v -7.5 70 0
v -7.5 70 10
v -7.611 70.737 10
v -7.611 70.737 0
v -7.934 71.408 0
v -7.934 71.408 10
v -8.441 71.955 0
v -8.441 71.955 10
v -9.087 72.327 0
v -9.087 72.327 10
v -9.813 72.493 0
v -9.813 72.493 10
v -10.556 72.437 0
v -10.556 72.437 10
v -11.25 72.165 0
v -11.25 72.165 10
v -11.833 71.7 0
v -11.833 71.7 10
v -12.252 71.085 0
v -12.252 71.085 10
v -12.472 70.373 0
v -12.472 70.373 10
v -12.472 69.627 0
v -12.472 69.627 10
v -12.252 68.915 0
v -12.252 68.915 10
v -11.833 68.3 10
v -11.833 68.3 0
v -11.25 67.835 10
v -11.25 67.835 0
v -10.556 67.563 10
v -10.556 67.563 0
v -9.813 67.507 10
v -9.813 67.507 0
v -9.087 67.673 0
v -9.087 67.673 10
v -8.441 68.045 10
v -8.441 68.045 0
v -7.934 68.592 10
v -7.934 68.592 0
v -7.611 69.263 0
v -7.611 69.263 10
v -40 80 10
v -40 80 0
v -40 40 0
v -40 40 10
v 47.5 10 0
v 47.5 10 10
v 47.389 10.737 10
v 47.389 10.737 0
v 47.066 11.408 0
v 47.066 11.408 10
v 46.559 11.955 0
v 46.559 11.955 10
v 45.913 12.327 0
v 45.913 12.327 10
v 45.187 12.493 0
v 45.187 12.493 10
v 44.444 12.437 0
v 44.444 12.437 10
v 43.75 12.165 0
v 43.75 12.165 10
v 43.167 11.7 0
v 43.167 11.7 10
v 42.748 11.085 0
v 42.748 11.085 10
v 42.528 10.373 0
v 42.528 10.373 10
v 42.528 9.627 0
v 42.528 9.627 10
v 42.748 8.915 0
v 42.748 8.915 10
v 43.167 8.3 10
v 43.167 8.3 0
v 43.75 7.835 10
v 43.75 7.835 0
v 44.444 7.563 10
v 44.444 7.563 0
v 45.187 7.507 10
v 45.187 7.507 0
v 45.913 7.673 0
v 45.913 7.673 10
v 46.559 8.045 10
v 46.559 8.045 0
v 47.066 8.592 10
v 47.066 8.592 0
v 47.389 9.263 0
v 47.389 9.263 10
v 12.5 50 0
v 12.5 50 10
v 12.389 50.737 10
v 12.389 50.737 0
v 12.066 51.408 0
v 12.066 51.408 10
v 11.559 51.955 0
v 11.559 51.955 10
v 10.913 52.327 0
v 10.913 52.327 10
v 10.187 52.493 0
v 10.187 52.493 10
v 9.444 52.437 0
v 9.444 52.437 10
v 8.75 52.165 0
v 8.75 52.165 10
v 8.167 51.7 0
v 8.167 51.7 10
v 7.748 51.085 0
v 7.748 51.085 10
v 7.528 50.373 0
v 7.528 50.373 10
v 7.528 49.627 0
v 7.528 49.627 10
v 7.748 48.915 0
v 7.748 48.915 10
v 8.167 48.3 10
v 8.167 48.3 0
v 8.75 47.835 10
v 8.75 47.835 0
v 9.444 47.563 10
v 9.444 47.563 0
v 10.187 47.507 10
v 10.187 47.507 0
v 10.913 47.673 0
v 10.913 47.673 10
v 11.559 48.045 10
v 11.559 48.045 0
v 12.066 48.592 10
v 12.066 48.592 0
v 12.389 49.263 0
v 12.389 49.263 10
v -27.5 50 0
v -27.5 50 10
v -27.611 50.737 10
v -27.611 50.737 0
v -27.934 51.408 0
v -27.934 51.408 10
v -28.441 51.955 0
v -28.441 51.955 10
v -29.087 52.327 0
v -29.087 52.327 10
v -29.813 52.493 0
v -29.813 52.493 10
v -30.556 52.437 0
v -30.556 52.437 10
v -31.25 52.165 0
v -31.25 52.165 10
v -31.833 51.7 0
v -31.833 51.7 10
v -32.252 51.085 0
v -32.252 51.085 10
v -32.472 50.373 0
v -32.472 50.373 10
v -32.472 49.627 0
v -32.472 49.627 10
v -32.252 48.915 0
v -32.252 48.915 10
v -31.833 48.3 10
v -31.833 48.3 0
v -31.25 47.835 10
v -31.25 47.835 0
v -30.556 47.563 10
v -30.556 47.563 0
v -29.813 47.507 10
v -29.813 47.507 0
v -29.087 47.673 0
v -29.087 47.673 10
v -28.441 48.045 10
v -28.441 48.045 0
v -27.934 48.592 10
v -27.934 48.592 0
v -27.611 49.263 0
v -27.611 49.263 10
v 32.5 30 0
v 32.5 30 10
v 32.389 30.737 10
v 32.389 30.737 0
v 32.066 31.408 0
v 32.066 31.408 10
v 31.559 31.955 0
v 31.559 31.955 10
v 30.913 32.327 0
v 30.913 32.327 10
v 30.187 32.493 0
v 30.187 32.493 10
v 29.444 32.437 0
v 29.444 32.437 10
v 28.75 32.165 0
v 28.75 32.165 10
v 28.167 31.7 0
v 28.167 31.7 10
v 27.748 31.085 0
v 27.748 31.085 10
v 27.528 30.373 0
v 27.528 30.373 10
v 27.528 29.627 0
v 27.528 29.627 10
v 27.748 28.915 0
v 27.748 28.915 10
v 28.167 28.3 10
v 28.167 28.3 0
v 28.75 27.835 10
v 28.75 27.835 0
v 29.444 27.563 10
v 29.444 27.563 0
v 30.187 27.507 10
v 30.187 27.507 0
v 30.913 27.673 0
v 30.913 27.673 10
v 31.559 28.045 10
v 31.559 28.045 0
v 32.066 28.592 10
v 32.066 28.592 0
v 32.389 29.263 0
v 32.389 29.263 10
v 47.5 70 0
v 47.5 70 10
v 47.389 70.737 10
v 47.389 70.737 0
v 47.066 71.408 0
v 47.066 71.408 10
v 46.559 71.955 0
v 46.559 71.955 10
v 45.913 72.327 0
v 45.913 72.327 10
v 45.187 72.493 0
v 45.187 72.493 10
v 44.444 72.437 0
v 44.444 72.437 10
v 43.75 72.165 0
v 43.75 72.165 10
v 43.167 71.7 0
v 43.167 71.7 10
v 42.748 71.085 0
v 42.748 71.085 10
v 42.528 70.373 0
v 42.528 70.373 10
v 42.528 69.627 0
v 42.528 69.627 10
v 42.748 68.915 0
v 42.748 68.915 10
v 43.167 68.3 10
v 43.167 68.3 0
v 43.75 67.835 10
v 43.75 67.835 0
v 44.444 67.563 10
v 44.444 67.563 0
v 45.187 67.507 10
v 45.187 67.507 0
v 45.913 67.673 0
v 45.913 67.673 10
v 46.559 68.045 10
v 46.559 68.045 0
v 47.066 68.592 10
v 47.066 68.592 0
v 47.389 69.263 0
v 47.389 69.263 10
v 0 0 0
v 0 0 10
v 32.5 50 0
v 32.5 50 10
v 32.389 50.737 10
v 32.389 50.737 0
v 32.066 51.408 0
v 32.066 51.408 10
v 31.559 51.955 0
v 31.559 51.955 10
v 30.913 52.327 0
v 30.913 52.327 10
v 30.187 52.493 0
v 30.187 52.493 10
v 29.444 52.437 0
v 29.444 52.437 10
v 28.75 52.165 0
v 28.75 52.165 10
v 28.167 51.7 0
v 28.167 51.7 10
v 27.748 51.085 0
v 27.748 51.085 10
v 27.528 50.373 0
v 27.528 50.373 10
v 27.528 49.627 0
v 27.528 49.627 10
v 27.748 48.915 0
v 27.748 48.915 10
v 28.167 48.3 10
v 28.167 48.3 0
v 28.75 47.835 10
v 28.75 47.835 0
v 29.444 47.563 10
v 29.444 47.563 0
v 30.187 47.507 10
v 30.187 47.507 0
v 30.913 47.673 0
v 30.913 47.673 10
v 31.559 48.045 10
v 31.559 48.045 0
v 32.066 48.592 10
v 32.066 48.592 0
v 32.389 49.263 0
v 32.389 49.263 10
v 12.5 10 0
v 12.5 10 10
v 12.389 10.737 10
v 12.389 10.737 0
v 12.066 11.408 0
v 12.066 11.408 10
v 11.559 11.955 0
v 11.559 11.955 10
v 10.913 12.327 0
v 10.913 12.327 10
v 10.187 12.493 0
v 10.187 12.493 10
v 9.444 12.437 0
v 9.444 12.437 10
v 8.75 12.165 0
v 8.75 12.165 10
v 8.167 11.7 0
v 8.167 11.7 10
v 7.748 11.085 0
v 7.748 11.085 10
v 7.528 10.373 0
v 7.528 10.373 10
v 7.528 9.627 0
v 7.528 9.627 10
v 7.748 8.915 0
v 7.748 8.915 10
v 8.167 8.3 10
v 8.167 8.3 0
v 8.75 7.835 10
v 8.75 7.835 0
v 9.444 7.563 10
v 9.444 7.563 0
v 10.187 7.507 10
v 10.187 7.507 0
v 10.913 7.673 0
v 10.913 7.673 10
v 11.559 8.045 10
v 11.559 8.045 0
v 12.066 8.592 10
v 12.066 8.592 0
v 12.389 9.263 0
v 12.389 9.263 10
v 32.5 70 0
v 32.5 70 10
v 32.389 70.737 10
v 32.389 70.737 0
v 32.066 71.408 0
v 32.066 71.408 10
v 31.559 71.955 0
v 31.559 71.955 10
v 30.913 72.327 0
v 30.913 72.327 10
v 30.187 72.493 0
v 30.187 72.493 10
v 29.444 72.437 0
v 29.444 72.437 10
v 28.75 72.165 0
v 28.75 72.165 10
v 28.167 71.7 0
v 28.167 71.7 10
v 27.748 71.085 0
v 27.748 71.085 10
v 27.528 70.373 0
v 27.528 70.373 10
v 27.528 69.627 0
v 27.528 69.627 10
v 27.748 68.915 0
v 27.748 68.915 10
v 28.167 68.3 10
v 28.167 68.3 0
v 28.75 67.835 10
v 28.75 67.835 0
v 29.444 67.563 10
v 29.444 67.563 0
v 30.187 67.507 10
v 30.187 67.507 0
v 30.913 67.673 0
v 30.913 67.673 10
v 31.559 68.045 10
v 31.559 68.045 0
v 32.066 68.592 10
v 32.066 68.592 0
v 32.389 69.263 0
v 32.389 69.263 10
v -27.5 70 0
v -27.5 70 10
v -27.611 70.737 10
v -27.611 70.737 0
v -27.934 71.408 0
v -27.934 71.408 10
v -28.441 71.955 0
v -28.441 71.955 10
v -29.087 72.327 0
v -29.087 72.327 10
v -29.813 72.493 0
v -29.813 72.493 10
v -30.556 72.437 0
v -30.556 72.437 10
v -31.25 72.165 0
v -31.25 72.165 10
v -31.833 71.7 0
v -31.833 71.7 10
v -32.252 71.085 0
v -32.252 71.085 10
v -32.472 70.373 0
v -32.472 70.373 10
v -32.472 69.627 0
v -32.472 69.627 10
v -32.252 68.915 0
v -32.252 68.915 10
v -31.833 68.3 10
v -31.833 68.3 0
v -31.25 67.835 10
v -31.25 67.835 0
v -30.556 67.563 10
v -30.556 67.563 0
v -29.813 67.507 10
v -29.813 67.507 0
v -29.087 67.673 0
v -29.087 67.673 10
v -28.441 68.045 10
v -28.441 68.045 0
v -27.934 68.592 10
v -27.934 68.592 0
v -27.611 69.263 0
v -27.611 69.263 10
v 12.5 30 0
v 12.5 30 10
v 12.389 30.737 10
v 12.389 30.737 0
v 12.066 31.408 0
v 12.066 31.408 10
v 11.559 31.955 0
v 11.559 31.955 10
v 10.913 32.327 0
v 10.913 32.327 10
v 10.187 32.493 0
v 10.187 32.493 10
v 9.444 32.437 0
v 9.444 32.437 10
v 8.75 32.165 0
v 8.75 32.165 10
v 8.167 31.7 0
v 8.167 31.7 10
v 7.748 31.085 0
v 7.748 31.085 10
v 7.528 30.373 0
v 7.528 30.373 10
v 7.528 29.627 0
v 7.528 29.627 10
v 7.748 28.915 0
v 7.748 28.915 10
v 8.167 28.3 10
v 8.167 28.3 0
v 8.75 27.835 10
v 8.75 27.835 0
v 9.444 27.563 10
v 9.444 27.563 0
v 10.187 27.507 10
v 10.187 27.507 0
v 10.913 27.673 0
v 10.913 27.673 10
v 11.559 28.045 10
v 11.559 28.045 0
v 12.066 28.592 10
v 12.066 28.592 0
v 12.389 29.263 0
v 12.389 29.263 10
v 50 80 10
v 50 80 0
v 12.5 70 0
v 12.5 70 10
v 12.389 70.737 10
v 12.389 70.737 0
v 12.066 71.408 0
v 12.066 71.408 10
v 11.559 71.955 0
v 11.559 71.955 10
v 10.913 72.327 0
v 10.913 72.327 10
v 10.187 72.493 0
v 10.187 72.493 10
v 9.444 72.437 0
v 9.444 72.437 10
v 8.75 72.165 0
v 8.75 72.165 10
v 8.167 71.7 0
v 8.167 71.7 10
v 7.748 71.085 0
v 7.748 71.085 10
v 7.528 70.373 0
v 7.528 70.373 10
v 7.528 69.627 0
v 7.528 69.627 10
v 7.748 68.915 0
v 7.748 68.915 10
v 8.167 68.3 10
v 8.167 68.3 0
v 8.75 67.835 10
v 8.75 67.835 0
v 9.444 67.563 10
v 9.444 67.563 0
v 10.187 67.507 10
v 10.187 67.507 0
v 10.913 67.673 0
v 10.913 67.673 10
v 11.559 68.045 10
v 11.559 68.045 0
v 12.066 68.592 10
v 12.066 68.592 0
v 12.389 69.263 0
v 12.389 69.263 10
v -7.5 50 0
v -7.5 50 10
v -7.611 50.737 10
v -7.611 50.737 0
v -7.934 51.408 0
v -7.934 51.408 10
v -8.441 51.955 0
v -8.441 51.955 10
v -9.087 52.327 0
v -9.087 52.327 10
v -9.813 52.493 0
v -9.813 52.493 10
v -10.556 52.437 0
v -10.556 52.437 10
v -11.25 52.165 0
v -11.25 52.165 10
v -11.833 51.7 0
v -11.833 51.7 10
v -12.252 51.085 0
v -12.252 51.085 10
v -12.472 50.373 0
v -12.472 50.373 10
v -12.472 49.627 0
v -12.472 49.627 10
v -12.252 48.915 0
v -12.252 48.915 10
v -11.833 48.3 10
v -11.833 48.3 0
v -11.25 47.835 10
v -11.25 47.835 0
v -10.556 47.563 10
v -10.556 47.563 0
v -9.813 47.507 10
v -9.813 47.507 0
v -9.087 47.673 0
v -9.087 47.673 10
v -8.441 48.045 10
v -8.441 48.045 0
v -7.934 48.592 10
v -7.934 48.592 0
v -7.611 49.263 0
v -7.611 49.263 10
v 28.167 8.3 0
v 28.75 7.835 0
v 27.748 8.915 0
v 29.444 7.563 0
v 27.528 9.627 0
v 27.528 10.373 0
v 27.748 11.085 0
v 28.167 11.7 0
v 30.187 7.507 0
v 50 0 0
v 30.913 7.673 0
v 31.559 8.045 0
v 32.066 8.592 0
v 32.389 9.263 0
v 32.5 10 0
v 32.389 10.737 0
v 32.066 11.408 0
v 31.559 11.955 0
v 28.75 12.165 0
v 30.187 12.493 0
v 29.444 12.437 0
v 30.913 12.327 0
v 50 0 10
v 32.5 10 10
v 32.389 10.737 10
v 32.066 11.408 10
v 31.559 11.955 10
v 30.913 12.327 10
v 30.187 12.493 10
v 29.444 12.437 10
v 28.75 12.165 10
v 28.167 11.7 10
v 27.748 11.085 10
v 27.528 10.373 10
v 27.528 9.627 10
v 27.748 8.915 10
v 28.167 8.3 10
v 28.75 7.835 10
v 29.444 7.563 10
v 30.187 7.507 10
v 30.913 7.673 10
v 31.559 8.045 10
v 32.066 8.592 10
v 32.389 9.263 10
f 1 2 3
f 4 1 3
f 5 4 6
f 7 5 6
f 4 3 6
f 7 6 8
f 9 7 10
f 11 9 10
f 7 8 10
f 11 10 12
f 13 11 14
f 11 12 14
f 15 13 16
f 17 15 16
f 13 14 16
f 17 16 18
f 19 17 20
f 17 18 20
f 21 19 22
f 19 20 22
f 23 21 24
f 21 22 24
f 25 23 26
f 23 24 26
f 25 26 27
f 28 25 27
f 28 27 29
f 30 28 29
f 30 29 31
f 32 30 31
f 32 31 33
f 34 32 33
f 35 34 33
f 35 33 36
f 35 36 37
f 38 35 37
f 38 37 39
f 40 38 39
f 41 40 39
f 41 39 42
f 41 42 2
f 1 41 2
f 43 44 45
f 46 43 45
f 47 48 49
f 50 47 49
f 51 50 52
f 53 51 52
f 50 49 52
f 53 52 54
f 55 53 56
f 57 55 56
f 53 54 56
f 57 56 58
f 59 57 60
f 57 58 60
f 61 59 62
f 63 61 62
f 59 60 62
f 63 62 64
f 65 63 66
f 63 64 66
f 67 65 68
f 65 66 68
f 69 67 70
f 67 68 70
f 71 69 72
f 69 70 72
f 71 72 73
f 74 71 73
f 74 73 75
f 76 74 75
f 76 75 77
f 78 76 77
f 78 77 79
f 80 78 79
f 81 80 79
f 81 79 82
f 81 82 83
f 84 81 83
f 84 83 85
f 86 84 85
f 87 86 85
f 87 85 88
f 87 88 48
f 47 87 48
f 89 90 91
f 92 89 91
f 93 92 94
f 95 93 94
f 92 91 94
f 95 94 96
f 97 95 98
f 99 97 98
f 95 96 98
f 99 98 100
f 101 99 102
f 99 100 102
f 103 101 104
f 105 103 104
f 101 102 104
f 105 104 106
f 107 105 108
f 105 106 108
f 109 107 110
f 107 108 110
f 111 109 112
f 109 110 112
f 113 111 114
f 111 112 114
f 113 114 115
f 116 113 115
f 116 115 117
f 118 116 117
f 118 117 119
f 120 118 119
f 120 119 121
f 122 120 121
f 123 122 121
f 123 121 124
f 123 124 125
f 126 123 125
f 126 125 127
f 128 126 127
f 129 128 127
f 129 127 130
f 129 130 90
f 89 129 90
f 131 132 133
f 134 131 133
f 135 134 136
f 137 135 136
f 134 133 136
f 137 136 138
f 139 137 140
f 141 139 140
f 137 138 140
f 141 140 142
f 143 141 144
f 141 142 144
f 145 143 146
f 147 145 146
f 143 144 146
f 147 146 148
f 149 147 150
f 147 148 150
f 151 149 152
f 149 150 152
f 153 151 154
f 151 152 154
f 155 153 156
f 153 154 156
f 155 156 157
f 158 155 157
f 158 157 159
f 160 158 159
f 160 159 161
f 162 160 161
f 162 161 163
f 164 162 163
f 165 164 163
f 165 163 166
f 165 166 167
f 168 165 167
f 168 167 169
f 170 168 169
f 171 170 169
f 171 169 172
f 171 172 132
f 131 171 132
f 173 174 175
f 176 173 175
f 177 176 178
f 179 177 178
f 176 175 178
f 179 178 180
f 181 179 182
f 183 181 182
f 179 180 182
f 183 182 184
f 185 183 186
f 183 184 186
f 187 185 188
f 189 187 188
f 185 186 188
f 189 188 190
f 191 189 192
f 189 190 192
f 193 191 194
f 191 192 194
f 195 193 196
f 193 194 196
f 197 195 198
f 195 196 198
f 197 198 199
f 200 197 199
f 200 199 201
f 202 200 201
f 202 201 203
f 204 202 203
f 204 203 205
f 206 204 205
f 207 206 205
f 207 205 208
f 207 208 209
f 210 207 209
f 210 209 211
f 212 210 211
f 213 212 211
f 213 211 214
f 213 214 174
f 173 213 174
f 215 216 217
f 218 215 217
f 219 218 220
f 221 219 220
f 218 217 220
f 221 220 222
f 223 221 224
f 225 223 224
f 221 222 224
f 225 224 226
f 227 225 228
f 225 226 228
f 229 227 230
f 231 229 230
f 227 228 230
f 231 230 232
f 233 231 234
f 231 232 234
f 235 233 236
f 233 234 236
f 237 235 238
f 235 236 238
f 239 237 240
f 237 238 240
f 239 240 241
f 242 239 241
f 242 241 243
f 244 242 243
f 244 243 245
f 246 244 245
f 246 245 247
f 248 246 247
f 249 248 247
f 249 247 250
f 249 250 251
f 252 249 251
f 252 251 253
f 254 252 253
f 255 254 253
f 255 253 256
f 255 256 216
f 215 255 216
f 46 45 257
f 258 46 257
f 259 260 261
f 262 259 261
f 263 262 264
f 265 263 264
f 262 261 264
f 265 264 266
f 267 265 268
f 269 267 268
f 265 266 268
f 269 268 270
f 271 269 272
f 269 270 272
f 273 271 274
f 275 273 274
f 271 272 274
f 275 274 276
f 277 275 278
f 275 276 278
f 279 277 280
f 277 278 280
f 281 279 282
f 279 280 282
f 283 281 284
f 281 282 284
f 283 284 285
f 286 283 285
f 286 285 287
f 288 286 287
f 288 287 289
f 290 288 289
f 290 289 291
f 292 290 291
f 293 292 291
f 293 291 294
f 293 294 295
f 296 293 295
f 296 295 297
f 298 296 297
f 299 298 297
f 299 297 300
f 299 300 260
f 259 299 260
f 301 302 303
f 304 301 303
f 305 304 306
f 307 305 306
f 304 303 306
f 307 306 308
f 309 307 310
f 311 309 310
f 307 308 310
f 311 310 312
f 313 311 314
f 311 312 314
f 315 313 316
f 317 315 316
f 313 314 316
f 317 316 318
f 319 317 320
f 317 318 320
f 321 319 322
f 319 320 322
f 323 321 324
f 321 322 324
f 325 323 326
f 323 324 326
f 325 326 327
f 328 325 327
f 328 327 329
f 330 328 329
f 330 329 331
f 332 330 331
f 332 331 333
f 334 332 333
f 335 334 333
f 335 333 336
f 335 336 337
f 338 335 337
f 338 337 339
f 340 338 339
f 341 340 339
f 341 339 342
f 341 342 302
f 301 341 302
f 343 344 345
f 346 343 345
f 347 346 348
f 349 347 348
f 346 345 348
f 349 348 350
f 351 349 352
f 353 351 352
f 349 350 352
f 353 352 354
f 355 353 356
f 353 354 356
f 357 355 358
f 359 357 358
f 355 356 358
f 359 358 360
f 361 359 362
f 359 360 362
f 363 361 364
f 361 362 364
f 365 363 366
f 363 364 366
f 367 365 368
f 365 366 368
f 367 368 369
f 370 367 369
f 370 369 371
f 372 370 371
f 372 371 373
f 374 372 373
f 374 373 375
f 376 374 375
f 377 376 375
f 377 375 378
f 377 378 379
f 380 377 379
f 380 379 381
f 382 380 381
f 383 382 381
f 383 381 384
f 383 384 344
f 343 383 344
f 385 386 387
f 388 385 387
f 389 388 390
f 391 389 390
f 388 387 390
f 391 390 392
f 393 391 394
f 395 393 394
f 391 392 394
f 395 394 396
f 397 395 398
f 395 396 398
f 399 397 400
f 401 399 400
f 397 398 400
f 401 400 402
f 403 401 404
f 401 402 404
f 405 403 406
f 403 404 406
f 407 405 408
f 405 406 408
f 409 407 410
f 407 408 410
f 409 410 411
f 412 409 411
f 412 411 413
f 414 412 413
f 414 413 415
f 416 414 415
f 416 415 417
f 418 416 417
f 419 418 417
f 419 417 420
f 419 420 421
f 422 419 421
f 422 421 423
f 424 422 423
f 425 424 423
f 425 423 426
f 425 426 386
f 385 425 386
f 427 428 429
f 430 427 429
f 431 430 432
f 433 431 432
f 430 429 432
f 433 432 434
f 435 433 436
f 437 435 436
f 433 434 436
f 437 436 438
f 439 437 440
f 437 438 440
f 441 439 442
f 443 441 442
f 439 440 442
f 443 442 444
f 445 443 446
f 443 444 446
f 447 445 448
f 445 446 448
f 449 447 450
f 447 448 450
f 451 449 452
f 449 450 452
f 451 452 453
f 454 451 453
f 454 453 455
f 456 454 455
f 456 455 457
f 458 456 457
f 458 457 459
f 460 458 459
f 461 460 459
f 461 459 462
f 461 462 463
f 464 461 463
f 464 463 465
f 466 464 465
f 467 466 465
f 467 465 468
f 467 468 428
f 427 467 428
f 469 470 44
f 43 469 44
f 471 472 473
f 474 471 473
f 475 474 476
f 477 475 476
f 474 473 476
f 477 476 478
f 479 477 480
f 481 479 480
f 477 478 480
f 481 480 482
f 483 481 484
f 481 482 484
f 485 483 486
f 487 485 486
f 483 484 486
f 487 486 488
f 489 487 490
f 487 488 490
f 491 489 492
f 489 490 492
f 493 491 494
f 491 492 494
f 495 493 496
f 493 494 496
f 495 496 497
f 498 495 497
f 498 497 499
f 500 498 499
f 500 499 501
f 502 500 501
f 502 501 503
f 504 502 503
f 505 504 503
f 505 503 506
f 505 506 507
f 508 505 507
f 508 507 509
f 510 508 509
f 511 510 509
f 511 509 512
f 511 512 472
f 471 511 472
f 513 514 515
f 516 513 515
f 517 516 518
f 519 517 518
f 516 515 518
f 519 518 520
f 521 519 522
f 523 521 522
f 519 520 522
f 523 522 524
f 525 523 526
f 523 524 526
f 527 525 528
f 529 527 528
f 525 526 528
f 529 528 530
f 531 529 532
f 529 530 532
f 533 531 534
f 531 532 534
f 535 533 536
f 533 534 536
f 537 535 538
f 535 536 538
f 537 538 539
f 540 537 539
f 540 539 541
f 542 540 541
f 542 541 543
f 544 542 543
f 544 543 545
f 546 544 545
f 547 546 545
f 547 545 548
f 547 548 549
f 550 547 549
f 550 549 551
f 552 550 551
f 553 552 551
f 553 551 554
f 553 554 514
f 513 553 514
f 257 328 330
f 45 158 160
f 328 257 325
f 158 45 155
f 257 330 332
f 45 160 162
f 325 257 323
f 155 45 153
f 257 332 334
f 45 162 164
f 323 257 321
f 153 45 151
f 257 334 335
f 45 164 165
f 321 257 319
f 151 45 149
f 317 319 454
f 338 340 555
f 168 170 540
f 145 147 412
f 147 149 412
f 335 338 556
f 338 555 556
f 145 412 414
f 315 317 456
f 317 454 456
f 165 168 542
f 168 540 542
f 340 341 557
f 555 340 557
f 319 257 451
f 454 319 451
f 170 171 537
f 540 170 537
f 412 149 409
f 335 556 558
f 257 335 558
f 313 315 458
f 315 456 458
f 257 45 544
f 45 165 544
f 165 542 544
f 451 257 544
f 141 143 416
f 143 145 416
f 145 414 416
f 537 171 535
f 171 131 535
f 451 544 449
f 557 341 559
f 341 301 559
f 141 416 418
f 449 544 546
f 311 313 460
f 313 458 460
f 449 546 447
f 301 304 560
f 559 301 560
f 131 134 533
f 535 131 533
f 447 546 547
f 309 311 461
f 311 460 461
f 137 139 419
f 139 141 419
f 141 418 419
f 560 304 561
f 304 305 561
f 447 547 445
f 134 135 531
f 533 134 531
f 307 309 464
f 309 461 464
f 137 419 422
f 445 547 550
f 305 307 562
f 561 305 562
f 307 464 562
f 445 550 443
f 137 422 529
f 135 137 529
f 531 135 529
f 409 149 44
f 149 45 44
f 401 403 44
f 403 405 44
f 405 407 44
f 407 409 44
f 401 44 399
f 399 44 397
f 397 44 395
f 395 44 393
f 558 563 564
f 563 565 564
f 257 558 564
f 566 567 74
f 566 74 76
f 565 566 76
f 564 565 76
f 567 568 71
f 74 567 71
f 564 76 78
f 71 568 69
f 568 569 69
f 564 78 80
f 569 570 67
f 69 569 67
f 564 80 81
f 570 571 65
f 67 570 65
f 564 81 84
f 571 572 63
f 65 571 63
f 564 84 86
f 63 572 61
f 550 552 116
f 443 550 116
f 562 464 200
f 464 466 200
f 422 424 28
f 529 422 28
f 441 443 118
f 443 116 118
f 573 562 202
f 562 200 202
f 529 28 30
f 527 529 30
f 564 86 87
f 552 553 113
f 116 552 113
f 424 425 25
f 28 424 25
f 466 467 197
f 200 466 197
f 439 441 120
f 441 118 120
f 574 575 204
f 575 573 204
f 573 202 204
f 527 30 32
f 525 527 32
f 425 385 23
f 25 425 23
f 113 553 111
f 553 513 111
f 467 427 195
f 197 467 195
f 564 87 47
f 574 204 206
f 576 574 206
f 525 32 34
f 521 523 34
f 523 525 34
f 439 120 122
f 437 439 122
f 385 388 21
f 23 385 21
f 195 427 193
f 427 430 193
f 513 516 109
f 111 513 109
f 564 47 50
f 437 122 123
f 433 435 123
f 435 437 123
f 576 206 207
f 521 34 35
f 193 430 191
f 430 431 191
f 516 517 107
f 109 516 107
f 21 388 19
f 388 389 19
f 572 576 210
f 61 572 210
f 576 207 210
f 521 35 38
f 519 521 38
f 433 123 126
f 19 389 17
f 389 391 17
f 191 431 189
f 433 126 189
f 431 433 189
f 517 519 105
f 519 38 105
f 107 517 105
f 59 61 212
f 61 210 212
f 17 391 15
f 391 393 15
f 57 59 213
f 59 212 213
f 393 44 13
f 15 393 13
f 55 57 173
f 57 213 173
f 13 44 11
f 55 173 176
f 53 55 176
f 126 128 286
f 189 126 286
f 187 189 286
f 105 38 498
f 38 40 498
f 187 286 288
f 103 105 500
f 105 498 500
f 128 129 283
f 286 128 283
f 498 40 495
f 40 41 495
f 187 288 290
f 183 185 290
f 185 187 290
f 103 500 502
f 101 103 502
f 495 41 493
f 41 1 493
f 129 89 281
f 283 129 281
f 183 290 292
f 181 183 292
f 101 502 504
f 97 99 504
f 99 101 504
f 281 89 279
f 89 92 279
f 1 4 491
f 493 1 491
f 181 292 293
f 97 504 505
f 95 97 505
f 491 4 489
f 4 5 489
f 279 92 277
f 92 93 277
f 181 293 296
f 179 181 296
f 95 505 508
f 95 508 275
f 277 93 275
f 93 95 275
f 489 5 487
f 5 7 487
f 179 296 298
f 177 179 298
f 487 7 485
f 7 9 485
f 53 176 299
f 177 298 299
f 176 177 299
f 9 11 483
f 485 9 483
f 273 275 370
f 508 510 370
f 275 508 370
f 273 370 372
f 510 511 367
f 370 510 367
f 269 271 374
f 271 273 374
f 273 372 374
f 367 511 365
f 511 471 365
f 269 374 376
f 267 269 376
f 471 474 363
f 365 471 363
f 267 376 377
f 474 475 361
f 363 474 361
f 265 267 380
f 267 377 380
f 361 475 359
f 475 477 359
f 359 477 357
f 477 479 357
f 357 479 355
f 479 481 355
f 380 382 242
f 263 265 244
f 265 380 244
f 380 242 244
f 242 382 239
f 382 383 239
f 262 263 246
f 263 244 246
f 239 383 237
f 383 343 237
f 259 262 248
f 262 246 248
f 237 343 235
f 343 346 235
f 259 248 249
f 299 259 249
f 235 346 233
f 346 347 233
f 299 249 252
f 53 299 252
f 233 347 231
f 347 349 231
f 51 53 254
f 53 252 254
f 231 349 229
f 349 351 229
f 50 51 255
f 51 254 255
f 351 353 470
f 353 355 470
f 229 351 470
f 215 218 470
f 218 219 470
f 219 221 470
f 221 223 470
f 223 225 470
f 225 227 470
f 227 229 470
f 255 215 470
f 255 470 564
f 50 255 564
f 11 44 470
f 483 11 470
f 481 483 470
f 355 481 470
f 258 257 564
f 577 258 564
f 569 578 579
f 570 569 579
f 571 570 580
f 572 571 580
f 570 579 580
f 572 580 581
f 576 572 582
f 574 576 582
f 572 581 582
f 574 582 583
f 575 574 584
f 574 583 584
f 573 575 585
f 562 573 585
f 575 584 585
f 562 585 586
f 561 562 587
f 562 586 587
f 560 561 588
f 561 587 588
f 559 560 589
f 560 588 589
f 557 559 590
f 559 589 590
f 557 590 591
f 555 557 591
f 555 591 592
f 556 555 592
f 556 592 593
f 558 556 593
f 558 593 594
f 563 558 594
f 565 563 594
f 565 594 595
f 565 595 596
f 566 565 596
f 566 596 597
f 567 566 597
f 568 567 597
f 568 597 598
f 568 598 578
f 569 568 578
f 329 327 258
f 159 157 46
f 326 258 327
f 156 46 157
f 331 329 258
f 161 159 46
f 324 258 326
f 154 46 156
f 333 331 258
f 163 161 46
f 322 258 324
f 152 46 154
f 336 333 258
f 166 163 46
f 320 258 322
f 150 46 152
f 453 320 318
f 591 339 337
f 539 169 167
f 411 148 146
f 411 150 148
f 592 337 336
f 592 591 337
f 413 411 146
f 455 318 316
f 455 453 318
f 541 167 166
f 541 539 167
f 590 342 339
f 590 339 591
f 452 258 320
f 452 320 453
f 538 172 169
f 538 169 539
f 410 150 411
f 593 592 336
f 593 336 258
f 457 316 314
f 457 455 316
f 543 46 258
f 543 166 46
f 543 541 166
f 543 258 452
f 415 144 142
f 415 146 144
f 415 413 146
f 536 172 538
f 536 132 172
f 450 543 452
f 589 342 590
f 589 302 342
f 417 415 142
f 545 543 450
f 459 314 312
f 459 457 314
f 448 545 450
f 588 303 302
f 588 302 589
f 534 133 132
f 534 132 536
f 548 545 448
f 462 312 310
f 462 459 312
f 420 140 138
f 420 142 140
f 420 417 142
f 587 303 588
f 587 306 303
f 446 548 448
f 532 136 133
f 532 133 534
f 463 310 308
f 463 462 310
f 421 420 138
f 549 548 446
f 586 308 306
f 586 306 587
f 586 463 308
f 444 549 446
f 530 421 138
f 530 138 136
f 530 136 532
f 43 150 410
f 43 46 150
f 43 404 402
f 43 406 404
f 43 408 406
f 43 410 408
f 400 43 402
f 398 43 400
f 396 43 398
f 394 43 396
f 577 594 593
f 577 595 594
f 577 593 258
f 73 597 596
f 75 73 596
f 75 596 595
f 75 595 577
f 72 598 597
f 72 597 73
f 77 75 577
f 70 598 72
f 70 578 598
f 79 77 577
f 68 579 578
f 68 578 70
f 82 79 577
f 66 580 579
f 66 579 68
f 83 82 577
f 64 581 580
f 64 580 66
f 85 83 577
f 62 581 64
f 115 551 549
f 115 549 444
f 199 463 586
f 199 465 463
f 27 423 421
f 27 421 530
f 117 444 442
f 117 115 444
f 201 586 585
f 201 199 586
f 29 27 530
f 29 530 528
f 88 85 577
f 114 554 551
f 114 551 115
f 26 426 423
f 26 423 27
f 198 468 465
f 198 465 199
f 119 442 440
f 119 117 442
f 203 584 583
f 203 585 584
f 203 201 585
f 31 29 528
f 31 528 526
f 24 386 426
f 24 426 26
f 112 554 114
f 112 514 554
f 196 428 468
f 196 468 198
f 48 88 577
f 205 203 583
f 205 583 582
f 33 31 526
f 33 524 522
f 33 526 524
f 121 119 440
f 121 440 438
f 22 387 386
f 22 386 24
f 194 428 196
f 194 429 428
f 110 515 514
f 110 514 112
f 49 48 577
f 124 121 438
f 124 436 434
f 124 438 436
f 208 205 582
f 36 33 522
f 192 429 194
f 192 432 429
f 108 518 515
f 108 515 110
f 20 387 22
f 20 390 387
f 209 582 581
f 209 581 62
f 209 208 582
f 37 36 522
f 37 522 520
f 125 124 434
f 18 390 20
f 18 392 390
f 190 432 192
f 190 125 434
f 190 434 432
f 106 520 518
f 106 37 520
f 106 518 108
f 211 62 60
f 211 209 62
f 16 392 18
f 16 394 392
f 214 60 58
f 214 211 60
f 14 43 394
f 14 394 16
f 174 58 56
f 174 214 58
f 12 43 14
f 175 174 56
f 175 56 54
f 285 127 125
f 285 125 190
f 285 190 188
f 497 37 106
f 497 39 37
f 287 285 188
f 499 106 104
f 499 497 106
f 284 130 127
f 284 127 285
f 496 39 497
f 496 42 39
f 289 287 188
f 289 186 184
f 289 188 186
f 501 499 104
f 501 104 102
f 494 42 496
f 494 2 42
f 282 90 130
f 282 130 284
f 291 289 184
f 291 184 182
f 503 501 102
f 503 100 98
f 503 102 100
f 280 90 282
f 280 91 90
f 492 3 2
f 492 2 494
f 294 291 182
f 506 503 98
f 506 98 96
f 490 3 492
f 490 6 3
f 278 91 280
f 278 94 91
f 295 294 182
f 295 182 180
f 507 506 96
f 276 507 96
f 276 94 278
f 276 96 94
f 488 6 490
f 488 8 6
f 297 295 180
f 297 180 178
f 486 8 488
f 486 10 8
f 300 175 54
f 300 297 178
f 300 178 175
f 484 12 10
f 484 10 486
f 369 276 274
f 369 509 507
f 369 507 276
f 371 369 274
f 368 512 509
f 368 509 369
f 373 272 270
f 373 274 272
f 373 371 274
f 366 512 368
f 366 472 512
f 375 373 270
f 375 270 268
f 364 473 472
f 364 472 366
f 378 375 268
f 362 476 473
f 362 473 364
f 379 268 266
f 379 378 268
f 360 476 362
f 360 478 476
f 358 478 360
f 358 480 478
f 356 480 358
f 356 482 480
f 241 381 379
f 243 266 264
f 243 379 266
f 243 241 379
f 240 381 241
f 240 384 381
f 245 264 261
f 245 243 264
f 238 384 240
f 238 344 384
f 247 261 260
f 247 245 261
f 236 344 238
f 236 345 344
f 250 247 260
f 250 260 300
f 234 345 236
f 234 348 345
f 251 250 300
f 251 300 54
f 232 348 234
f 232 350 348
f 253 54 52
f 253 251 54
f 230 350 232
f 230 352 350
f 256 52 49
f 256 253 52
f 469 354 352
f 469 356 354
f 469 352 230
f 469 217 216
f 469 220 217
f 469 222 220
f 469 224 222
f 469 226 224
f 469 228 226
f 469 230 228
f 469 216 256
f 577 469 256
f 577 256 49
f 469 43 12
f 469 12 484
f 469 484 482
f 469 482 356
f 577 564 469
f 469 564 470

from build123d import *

# Parameters (mm, degrees)
BOSS_EXTRUDE1_DEPTH = 10
CUT_EXTRUDE1_REACH  = 96.868
SKETCH2_R           = 2.5


with BuildPart() as part:
    # Sketch1 → Boss-Extrude1 (new body)
    with BuildSketch(Plane.XY):
        Polygon((0, 0), (50, 0), (50, 80), (-40, 80), (-40, 40), align=None)
    extrude(amount=BOSS_EXTRUDE1_DEPTH)

    # Sketch2 → Cut-Extrude1 (cut, up to next)
    with BuildSketch(Plane.XY.offset(10), mode=Mode.PRIVATE) as cut_extrude1_sk1:
        with Locations((10, 10)):
            Circle(SKETCH2_R)
    cut_extrude1_tool1 = extrude(cut_extrude1_sk1.sketch, amount=-CUT_EXTRUDE1_REACH, mode=Mode.PRIVATE) & part.part
    # Sketch2 → Cut-Extrude1 (cut, up to next)
    with BuildSketch(Plane.XY.offset(10), mode=Mode.PRIVATE) as cut_extrude1_sk2:
        with Locations((30, 10)):
            Circle(SKETCH2_R)
    cut_extrude1_tool2 = extrude(cut_extrude1_sk2.sketch, amount=-CUT_EXTRUDE1_REACH, mode=Mode.PRIVATE) & part.part
    # Sketch2 → Cut-Extrude1 (cut, up to next)
    with BuildSketch(Plane.XY.offset(10), mode=Mode.PRIVATE) as cut_extrude1_sk3:
        with Locations((10, 30)):
            Circle(SKETCH2_R)
    cut_extrude1_tool3 = extrude(cut_extrude1_sk3.sketch, amount=-CUT_EXTRUDE1_REACH, mode=Mode.PRIVATE) & part.part
    # Sketch2 → Cut-Extrude1 (cut, up to next)
    with BuildSketch(Plane.XY.offset(10), mode=Mode.PRIVATE) as cut_extrude1_sk4:
        with Locations((30, 30)):
            Circle(SKETCH2_R)
    cut_extrude1_tool4 = extrude(cut_extrude1_sk4.sketch, amount=-CUT_EXTRUDE1_REACH, mode=Mode.PRIVATE) & part.part
    # Sketch2 → Cut-Extrude1 (cut, up to next)
    with BuildSketch(Plane.XY.offset(10), mode=Mode.PRIVATE) as cut_extrude1_sk5:
        with Locations((10, 50)):
            Circle(SKETCH2_R)
    cut_extrude1_tool5 = extrude(cut_extrude1_sk5.sketch, amount=-CUT_EXTRUDE1_REACH, mode=Mode.PRIVATE) & part.part
    # Sketch2 → Cut-Extrude1 (cut, up to next)
    with BuildSketch(Plane.XY.offset(10), mode=Mode.PRIVATE) as cut_extrude1_sk6:
        with Locations((30, 50)):
            Circle(SKETCH2_R)
    cut_extrude1_tool6 = extrude(cut_extrude1_sk6.sketch, amount=-CUT_EXTRUDE1_REACH, mode=Mode.PRIVATE) & part.part
    # Sketch2 → Cut-Extrude1 (cut, up to next)
    with BuildSketch(Plane.XY.offset(10), mode=Mode.PRIVATE) as cut_extrude1_sk7:
        with Locations((10, 70)):
            Circle(SKETCH2_R)
    cut_extrude1_tool7 = extrude(cut_extrude1_sk7.sketch, amount=-CUT_EXTRUDE1_REACH, mode=Mode.PRIVATE) & part.part
    # Sketch2 → Cut-Extrude1 (cut, up to next)
    with BuildSketch(Plane.XY.offset(10), mode=Mode.PRIVATE) as cut_extrude1_sk8:
        with Locations((30, 70)):
            Circle(SKETCH2_R)
    cut_extrude1_tool8 = extrude(cut_extrude1_sk8.sketch, amount=-CUT_EXTRUDE1_REACH, mode=Mode.PRIVATE) & part.part
    # Sketch2 → Cut-Extrude1 (cut, up to next)
    with BuildSketch(Plane.XY.offset(10), mode=Mode.PRIVATE) as cut_extrude1_sk9:
        with Locations((-30, 50)):
            Circle(SKETCH2_R)
    cut_extrude1_tool9 = extrude(cut_extrude1_sk9.sketch, amount=-CUT_EXTRUDE1_REACH, mode=Mode.PRIVATE) & part.part
    # Sketch2 → Cut-Extrude1 (cut, up to next)
    with BuildSketch(Plane.XY.offset(10), mode=Mode.PRIVATE) as cut_extrude1_sk10:
        with Locations((-10, 50)):
            Circle(SKETCH2_R)
    cut_extrude1_tool10 = extrude(cut_extrude1_sk10.sketch, amount=-CUT_EXTRUDE1_REACH, mode=Mode.PRIVATE) & part.part
    # Sketch2 → Cut-Extrude1 (cut, up to next)
    with BuildSketch(Plane.XY.offset(10), mode=Mode.PRIVATE) as cut_extrude1_sk11:
        with Locations((-30, 70)):
            Circle(SKETCH2_R)
    cut_extrude1_tool11 = extrude(cut_extrude1_sk11.sketch, amount=-CUT_EXTRUDE1_REACH, mode=Mode.PRIVATE) & part.part
    # Sketch2 → Cut-Extrude1 (cut, up to next)
    with BuildSketch(Plane.XY.offset(10), mode=Mode.PRIVATE) as cut_extrude1_sk12:
        with Locations((-10, 70)):
            Circle(SKETCH2_R)
    cut_extrude1_tool12 = extrude(cut_extrude1_sk12.sketch, amount=-CUT_EXTRUDE1_REACH, mode=Mode.PRIVATE) & part.part
    # Sketch2 → Cut-Extrude1 (cut, up to next)
    with BuildSketch(Plane.XY.offset(10), mode=Mode.PRIVATE) as cut_extrude1_sk13:
        with Locations((45, 10)):
            Circle(SKETCH2_R)
    cut_extrude1_tool13 = extrude(cut_extrude1_sk13.sketch, amount=-CUT_EXTRUDE1_REACH, mode=Mode.PRIVATE) & part.part
    # Sketch2 → Cut-Extrude1 (cut, up to next)
    with BuildSketch(Plane.XY.offset(10), mode=Mode.PRIVATE) as cut_extrude1_sk14:
        with Locations((45, 70)):
            Circle(SKETCH2_R)
    cut_extrude1_tool14 = extrude(cut_extrude1_sk14.sketch, amount=-CUT_EXTRUDE1_REACH, mode=Mode.PRIVATE) & part.part
    add(cut_extrude1_tool1.solids().sort_by_distance((10, 10, 10))[0], mode=Mode.SUBTRACT)
    add(cut_extrude1_tool2.solids().sort_by_distance((30, 10, 10))[0], mode=Mode.SUBTRACT)
    add(cut_extrude1_tool3.solids().sort_by_distance((10, 30, 10))[0], mode=Mode.SUBTRACT)
    add(cut_extrude1_tool4.solids().sort_by_distance((30, 30, 10))[0], mode=Mode.SUBTRACT)
    add(cut_extrude1_tool5.solids().sort_by_distance((10, 50, 10))[0], mode=Mode.SUBTRACT)
    add(cut_extrude1_tool6.solids().sort_by_distance((30, 50, 10))[0], mode=Mode.SUBTRACT)
    add(cut_extrude1_tool7.solids().sort_by_distance((10, 70, 10))[0], mode=Mode.SUBTRACT)
    add(cut_extrude1_tool8.solids().sort_by_distance((30, 70, 10))[0], mode=Mode.SUBTRACT)
    add(cut_extrude1_tool9.solids().sort_by_distance((-30, 50, 10))[0], mode=Mode.SUBTRACT)
    add(cut_extrude1_tool10.solids().sort_by_distance((-10, 50, 10))[0], mode=Mode.SUBTRACT)
    add(cut_extrude1_tool11.solids().sort_by_distance((-30, 70, 10))[0], mode=Mode.SUBTRACT)
    add(cut_extrude1_tool12.solids().sort_by_distance((-10, 70, 10))[0], mode=Mode.SUBTRACT)
    add(cut_extrude1_tool13.solids().sort_by_distance((45, 10, 10))[0], mode=Mode.SUBTRACT)
    add(cut_extrude1_tool14.solids().sort_by_distance((45, 70, 10))[0], mode=Mode.SUBTRACT)


solid = part.part
